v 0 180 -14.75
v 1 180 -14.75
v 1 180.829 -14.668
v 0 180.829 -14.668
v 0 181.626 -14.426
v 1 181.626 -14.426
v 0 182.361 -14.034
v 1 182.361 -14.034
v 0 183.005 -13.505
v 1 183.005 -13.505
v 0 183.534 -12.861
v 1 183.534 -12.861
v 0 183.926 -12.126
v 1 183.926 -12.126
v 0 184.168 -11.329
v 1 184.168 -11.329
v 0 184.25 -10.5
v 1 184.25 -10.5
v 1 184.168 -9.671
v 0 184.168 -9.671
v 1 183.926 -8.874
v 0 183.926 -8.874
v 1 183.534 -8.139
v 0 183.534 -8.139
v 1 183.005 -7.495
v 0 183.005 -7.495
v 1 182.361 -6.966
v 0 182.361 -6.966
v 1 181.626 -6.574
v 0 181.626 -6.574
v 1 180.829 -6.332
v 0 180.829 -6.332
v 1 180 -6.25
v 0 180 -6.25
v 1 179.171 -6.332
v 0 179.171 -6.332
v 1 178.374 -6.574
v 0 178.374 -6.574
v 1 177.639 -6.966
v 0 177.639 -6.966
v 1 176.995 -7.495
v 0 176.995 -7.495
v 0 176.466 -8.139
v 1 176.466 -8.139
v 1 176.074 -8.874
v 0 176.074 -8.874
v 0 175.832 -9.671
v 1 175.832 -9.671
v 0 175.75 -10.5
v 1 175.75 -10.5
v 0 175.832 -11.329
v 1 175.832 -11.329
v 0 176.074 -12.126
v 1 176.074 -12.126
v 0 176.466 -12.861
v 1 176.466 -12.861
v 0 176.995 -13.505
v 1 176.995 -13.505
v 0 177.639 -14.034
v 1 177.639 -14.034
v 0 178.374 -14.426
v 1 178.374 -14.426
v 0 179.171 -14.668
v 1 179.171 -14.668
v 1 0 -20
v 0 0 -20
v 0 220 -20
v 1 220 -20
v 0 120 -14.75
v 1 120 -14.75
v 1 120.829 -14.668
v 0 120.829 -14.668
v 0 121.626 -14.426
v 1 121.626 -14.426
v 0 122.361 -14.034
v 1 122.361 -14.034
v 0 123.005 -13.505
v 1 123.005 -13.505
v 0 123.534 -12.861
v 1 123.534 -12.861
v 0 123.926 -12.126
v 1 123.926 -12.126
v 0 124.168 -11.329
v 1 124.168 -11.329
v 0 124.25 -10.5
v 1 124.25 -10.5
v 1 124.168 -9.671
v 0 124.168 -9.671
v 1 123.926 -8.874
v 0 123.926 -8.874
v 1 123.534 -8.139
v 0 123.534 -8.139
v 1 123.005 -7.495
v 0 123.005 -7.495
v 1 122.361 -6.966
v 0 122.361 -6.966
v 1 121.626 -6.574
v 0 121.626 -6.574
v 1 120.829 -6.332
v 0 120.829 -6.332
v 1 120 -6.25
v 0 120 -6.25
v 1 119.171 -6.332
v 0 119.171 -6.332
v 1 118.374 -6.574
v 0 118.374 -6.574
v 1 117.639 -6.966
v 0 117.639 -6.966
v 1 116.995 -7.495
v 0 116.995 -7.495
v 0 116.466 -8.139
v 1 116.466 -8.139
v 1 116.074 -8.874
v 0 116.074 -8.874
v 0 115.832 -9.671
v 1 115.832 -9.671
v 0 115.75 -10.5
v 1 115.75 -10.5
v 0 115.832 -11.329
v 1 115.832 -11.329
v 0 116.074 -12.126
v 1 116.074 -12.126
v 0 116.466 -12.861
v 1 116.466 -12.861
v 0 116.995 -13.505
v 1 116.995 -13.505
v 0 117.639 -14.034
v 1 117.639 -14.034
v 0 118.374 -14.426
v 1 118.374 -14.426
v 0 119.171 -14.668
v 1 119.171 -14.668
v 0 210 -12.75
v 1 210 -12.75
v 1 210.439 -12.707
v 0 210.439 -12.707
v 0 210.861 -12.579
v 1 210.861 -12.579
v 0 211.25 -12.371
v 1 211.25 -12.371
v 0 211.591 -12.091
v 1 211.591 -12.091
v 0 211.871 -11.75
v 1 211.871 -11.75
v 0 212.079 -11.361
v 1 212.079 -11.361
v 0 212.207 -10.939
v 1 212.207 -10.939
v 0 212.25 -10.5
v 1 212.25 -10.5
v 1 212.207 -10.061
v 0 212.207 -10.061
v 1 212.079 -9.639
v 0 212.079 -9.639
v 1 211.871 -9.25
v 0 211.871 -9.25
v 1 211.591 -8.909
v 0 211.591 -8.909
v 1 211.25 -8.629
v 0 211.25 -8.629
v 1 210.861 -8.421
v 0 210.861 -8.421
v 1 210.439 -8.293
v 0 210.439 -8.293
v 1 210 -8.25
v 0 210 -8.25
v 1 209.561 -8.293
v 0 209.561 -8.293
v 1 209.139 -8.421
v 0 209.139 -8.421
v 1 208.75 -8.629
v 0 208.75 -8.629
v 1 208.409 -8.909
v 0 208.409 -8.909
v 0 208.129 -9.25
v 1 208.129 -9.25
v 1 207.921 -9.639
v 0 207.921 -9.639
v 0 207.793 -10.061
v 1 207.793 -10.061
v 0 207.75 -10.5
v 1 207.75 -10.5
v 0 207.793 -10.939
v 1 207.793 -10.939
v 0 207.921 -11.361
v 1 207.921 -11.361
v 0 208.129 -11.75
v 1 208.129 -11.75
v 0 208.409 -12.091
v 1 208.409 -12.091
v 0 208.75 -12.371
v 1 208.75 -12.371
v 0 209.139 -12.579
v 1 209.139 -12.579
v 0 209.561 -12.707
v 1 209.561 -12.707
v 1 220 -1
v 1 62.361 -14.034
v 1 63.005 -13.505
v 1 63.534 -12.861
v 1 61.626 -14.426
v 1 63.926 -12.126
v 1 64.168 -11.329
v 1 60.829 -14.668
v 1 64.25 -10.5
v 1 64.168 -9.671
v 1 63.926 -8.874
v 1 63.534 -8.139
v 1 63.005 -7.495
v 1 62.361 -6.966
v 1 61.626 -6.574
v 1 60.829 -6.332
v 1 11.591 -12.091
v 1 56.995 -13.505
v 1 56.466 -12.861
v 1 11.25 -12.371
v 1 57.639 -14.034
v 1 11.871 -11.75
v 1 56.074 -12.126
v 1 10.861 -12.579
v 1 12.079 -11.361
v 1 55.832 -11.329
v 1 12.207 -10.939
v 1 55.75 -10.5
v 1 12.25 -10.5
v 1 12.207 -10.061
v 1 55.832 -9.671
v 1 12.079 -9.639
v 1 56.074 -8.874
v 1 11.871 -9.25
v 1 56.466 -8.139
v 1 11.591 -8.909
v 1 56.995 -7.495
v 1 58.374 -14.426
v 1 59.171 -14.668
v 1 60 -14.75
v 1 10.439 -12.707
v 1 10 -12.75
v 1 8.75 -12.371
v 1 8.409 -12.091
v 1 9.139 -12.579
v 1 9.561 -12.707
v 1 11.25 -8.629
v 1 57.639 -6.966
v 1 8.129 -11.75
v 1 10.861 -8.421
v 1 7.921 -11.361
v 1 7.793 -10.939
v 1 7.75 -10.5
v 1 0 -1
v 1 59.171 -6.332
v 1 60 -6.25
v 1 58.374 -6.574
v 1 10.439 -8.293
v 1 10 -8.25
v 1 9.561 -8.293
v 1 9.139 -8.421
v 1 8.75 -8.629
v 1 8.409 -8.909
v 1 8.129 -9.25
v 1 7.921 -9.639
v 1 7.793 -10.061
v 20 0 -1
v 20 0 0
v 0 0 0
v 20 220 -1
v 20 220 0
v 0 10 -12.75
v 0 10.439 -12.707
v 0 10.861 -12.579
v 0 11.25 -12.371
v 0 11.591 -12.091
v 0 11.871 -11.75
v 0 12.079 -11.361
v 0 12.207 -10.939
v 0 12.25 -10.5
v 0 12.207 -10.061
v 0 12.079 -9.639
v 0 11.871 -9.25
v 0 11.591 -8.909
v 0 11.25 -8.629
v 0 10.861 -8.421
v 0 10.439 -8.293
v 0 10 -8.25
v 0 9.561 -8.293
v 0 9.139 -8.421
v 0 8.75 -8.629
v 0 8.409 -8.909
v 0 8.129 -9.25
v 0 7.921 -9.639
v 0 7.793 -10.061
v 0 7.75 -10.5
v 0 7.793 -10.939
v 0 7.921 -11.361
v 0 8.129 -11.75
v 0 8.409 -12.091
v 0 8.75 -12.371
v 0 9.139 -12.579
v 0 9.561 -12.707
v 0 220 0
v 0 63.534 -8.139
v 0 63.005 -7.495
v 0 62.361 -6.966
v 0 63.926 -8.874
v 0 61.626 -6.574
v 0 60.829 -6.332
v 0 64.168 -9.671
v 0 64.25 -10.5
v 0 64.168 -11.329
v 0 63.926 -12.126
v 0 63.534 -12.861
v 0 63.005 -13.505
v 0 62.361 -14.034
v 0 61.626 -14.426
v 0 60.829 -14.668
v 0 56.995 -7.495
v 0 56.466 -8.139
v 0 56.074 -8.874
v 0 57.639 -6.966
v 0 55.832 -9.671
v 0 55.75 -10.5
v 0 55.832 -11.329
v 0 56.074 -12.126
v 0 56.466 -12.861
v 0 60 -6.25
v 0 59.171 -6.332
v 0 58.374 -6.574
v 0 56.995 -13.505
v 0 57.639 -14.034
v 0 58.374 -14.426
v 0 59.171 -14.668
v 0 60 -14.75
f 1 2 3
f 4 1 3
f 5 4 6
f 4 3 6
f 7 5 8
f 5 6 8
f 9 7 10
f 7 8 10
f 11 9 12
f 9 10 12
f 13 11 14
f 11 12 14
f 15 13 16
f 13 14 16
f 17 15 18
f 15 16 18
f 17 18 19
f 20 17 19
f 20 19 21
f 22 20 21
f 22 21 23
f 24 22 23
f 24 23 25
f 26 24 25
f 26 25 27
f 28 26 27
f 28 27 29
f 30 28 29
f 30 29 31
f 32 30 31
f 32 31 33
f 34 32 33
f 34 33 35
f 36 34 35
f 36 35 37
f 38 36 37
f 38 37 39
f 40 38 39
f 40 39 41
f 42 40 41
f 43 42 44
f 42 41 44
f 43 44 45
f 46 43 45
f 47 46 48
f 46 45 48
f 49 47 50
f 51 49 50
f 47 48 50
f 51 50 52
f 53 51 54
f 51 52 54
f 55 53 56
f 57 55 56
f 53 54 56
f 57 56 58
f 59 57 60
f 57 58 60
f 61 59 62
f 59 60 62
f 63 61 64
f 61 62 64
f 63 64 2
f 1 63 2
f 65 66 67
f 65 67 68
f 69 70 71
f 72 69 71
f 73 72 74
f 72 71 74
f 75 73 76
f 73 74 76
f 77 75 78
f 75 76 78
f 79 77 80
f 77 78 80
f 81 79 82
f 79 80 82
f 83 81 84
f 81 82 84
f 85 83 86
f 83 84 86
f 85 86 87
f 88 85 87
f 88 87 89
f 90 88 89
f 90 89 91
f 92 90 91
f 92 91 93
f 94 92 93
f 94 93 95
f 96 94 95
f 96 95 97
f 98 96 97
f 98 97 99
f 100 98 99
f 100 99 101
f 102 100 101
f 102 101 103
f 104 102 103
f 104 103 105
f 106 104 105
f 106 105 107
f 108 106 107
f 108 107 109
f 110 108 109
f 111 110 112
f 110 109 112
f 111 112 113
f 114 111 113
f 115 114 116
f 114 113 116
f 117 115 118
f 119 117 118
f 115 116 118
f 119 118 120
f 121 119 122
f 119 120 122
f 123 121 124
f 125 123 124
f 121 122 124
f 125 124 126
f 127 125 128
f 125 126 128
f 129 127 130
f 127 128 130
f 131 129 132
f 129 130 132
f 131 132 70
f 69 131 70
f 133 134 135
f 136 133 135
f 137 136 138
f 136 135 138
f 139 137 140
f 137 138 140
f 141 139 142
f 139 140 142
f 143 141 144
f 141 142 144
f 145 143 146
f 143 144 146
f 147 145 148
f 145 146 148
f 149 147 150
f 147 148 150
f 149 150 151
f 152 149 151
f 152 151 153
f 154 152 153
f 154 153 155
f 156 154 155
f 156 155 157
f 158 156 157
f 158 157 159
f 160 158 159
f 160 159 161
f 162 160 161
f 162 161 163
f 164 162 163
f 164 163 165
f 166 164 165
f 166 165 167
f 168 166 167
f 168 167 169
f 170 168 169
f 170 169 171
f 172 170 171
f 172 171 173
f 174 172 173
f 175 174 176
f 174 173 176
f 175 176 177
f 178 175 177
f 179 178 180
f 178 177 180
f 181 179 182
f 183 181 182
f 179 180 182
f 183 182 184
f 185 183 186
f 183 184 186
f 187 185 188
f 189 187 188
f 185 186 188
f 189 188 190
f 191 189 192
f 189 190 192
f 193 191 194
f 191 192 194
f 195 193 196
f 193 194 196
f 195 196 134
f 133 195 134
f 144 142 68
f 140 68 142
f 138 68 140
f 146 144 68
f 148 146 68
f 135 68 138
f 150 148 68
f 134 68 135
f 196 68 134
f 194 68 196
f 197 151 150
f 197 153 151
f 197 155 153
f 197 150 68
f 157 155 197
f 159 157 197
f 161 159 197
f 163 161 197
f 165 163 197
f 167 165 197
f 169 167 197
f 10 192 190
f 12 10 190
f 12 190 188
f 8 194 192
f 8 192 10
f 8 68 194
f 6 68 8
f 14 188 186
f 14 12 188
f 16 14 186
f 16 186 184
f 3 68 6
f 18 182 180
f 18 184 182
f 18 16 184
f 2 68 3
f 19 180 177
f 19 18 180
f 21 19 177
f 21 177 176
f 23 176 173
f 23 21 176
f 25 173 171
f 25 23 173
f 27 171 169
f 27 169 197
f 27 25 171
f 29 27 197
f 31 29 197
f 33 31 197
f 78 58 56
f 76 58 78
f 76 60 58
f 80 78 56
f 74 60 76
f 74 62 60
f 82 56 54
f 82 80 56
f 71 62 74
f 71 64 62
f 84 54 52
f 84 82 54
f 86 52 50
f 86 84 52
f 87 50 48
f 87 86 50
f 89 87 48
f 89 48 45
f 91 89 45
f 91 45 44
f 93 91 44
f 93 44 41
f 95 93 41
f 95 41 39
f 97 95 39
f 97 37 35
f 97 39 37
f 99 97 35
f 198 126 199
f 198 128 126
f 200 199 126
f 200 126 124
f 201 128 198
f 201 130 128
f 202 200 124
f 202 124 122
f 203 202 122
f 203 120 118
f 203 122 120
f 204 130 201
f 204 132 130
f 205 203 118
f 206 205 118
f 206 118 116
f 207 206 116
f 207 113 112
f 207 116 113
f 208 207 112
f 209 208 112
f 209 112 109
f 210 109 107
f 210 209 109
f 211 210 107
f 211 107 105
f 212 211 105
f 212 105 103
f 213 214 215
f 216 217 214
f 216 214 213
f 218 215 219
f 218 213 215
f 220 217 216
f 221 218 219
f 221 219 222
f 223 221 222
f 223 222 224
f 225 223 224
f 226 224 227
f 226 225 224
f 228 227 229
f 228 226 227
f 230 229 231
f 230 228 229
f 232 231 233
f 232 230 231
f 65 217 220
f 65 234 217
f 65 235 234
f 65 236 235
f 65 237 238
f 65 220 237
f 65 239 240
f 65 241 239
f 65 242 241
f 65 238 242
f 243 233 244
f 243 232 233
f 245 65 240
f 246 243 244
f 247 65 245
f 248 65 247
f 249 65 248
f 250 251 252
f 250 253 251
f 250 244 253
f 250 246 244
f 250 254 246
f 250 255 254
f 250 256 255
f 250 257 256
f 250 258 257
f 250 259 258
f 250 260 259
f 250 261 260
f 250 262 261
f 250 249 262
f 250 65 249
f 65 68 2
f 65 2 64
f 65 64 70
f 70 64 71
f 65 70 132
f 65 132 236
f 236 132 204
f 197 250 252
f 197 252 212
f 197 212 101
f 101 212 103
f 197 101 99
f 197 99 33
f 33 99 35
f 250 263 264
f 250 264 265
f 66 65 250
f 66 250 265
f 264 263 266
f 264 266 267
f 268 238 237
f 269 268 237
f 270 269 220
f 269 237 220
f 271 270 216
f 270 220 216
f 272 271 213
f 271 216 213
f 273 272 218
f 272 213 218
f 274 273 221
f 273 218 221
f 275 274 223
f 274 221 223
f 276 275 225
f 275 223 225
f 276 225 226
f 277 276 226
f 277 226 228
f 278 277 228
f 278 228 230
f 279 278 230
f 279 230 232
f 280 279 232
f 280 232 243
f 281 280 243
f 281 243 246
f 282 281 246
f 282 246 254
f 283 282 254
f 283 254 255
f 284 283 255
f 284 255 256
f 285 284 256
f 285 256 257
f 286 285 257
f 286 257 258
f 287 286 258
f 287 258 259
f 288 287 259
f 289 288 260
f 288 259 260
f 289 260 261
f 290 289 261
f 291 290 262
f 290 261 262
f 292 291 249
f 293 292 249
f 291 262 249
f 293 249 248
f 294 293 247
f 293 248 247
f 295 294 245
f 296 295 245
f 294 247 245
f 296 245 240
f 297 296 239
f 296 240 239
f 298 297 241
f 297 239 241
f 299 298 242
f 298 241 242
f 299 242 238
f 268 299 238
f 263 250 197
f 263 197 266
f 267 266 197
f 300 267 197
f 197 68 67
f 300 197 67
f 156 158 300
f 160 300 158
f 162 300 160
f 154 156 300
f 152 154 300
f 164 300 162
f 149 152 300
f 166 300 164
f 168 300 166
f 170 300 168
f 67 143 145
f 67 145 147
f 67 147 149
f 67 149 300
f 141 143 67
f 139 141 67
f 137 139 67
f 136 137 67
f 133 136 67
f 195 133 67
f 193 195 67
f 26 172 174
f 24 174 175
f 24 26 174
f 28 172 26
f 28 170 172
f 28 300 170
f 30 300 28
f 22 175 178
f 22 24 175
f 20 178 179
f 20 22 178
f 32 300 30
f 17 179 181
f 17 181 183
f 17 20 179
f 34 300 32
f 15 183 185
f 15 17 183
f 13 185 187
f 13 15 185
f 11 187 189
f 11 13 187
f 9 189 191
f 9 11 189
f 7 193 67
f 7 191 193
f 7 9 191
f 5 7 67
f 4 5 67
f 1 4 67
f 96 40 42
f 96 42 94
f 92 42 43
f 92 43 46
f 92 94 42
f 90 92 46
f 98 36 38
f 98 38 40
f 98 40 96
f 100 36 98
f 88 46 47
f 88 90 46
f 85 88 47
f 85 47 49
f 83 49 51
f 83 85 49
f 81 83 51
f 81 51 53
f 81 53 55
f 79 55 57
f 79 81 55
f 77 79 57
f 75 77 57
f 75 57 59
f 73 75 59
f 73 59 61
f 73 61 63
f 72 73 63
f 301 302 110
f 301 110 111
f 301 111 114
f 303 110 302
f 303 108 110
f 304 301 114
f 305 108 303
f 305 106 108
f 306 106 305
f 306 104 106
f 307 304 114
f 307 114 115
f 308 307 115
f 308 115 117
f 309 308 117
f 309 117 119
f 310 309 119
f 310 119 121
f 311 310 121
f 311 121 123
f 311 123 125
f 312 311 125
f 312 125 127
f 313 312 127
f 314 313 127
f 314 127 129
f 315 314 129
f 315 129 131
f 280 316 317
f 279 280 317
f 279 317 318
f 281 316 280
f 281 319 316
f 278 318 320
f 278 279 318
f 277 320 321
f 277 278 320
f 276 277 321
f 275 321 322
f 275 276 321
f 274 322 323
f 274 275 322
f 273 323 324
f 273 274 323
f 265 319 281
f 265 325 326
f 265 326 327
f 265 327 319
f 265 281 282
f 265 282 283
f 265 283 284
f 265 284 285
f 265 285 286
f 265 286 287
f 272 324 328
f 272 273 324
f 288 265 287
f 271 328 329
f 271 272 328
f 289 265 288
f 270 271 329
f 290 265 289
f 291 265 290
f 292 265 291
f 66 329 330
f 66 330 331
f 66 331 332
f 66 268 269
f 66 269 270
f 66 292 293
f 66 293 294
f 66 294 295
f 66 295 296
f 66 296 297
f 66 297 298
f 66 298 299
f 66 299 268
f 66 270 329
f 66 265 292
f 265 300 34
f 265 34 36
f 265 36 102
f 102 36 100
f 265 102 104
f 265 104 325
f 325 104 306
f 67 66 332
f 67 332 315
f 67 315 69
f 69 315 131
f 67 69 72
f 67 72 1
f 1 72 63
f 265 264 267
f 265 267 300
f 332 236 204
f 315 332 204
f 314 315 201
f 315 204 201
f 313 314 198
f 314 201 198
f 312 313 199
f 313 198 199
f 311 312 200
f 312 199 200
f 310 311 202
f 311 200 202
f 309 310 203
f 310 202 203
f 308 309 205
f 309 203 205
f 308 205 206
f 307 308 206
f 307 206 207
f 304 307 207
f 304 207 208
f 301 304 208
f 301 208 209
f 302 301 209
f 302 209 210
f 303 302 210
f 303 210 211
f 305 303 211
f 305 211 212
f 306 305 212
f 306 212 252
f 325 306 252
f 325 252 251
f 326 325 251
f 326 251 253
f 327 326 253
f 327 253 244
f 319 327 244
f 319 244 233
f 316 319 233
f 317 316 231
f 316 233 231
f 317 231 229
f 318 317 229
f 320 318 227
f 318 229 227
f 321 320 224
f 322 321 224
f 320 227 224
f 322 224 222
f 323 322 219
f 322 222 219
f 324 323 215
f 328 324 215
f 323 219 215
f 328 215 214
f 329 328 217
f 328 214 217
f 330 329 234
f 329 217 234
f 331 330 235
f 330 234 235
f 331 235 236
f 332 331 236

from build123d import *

# Parameters (mm, degrees)
EXTRUDE_1_DEPTH     = 220
SKETCH_2_R          = 4.25
CUT_EXTRUDE_1_DEPTH = 2
SKETCH_3_R          = 2.25
CUT_EXTRUDE_2_DEPTH = 2
SKETCH_4_R          = 2.25
CUT_EXTRUDE_3_DEPTH = 2


with BuildPart() as part:
    # Эскиз1 → Бобышка-Вытянуть1 (new body)
    with BuildSketch(Plane(origin=(0, 0, 0), x_dir=(1, 0, 0), z_dir=(0, 1, 0))):
        Polygon((0, 0), (0, 20), (1, 20), (1, 1), (20, 1), (20, 0), align=None)
    extrude(amount=EXTRUDE_1_DEPTH)

    # Эскиз2 → Вырез-Вытянуть1 (cut, through all)
    with BuildSketch(Plane(origin=(1, 0, 0), x_dir=(0, 0, -1), z_dir=(1, 0, 0))):
        with Locations((10.5, 180)):
            Circle(SKETCH_2_R)
        with Locations((10.5, 120)):
            Circle(SKETCH_2_R)
        with Locations((10.5, 60)):
            Circle(SKETCH_2_R)
    extrude(amount=-CUT_EXTRUDE_1_DEPTH, mode=Mode.SUBTRACT)

    # Эскиз3 → Вырез-Вытянуть2 (cut, through all)
    with BuildSketch(Plane(origin=(1, 0, 0), x_dir=(0, 0, -1), z_dir=(1, 0, 0))):
        with Locations((10.5, 210)):
            Circle(SKETCH_3_R)
    extrude(amount=-CUT_EXTRUDE_2_DEPTH, mode=Mode.SUBTRACT)

    # Эскиз4 → Вырез-Вытянуть3 (cut, through all)
    with BuildSketch(Plane(origin=(1, 0, 0), x_dir=(0, 0, -1), z_dir=(1, 0, 0))):
        with Locations((10.5, 10)):
            Circle(SKETCH_4_R)
    extrude(amount=-CUT_EXTRUDE_3_DEPTH, mode=Mode.SUBTRACT)


solid = part.part
